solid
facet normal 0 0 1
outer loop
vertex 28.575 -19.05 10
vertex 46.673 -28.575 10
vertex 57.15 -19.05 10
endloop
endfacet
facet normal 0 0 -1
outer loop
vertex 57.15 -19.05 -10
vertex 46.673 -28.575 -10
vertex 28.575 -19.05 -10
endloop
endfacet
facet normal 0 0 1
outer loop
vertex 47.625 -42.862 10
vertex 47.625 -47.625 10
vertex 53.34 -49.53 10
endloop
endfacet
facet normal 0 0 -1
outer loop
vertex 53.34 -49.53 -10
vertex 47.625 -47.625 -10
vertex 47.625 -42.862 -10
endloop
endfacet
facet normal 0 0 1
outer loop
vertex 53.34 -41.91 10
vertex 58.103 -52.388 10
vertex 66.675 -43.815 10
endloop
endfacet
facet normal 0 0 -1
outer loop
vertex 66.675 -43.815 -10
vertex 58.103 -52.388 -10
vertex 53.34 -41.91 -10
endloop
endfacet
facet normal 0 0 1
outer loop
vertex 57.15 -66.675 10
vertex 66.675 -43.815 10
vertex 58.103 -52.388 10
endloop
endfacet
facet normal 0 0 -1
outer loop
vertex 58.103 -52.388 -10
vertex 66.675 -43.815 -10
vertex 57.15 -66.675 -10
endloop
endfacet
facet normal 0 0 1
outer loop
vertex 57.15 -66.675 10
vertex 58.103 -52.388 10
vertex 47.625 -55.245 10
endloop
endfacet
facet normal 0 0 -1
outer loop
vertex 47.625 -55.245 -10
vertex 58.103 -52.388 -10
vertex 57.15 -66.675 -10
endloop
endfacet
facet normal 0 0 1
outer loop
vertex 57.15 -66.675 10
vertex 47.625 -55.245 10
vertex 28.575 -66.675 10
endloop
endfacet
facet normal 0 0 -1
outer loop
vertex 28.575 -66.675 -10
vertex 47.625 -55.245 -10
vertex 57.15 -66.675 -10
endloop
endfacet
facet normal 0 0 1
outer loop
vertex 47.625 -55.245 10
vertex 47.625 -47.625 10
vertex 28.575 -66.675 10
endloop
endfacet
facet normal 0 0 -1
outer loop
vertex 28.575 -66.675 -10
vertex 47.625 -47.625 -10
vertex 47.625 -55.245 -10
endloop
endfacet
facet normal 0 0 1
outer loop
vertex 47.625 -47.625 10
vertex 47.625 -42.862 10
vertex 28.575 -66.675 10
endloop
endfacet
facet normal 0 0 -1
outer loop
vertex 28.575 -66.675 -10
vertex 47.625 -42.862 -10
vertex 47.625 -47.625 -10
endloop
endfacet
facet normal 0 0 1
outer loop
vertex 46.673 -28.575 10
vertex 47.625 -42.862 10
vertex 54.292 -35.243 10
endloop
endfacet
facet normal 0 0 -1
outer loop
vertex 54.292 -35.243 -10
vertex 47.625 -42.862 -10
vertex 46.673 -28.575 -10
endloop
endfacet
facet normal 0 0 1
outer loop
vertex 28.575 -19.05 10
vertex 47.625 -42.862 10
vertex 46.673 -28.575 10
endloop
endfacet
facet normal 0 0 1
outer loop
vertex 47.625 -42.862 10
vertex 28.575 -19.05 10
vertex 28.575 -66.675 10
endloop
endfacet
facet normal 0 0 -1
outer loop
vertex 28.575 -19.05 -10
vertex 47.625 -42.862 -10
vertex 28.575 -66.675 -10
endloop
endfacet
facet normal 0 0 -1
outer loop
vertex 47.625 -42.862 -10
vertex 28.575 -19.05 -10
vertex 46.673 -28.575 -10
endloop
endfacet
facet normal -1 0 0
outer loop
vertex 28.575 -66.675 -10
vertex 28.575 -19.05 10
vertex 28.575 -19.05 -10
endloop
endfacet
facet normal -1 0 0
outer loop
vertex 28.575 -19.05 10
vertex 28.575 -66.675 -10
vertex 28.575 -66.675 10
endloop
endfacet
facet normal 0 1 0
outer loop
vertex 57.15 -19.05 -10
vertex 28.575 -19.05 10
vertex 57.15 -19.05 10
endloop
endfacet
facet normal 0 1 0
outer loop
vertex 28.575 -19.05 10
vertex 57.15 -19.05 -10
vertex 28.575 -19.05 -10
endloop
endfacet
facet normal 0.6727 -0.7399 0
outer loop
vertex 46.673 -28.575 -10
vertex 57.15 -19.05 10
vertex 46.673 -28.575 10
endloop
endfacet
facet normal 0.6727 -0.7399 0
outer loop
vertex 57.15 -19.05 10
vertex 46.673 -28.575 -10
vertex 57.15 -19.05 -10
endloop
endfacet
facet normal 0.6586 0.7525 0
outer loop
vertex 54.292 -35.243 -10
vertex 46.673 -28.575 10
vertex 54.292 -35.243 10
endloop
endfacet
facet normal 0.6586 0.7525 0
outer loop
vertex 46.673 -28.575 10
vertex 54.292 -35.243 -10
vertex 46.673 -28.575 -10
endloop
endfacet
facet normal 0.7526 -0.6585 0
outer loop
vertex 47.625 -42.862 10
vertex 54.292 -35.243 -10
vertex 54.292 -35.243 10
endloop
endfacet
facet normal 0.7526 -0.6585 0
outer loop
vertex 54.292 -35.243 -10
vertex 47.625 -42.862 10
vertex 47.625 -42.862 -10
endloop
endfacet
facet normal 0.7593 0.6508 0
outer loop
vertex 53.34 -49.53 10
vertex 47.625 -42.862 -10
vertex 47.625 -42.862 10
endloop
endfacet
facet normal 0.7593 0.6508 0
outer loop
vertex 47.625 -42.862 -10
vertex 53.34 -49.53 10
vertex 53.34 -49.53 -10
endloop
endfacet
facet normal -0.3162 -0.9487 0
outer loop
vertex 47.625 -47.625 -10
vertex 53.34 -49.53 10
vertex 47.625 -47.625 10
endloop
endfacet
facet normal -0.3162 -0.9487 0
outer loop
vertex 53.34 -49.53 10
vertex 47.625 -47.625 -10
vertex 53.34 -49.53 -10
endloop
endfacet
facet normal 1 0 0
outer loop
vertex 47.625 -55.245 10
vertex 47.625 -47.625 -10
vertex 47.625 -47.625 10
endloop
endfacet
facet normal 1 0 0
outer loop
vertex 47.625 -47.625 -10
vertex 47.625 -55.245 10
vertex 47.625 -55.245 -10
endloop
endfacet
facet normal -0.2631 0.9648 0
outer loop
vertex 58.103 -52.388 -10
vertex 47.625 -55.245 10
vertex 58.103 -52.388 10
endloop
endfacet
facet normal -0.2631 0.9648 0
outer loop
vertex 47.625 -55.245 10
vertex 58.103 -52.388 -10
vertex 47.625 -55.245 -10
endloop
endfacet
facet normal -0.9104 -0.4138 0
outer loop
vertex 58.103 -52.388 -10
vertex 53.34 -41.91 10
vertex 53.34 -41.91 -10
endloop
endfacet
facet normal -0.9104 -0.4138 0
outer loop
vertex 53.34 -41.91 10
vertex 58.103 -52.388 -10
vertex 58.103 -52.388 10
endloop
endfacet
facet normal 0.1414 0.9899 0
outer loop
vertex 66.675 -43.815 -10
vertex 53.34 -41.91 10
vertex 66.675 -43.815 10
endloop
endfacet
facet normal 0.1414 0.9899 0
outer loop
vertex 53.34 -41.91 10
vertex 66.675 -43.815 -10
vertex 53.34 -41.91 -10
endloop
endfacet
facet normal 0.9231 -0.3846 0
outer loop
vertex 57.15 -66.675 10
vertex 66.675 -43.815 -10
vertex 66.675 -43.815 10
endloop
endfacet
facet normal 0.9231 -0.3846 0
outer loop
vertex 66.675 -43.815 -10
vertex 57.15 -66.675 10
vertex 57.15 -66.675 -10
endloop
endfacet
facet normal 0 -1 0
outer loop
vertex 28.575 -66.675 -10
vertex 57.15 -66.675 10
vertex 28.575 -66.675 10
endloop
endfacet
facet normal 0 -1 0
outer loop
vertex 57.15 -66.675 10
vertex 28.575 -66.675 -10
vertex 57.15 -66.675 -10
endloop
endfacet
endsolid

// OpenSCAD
polyhedron(
    points=[
    [28.575, -66.675, 10],
    [28.575, -19.05, 10],
    [57.15, -19.05, 10],
    [46.6725, -28.575, 10],
    [54.2925, -35.2425, 10],
    [47.625, -42.8625, 10],
    [53.34, -49.53, 10],
    [47.625, -47.625, 10],
    [47.625, -55.245, 10],
    [58.1025, -52.3875, 10],
    [53.34, -41.91, 10],
    [66.675, -43.815, 10],
    [57.15, -66.675, 10],
    [28.575, -66.675, -10],
    [28.575, -19.05, -10],
    [57.15, -19.05, -10],
    [46.6725, -28.575, -10],
    [54.2925, -35.2425, -10],
    [47.625, -42.8625, -10],
    [53.34, -49.53, -10],
    [47.625, -47.625, -10],
    [47.625, -55.245, -10],
    [58.1025, -52.3875, -10],
    [53.34, -41.91, -10],
    [66.675, -43.815, -10],
    [57.15, -66.675, -10],
    ],
    faces=[
        [2,3,1],
        [14,16,15],
        [6,7,5],
        [18,20,19],
        [11,9,10],
        [23,22,24],
        [9,11,12],
        [25,24,22],
        [8,9,12],
        [25,22,21],
        [0,8,12],
        [25,21,13],
        [0,7,8],
        [21,20,13],
        [0,5,7],
        [20,18,13],
        [4,5,3],
        [16,18,17],
        [3,5,0,1],
        [14,13,18,16],
        [0,13,14,1],
        [1,14,15,2],
        [2,15,16,3],
        [3,16,17,4],
        [4,17,18,5],
        [5,18,19,6],
        [6,19,20,7],
        [7,20,21,8],
        [8,21,22,9],
        [9,22,23,10],
        [10,23,24,11],
        [11,24,25,12],
        [12,25,13,0],
    ]
);
